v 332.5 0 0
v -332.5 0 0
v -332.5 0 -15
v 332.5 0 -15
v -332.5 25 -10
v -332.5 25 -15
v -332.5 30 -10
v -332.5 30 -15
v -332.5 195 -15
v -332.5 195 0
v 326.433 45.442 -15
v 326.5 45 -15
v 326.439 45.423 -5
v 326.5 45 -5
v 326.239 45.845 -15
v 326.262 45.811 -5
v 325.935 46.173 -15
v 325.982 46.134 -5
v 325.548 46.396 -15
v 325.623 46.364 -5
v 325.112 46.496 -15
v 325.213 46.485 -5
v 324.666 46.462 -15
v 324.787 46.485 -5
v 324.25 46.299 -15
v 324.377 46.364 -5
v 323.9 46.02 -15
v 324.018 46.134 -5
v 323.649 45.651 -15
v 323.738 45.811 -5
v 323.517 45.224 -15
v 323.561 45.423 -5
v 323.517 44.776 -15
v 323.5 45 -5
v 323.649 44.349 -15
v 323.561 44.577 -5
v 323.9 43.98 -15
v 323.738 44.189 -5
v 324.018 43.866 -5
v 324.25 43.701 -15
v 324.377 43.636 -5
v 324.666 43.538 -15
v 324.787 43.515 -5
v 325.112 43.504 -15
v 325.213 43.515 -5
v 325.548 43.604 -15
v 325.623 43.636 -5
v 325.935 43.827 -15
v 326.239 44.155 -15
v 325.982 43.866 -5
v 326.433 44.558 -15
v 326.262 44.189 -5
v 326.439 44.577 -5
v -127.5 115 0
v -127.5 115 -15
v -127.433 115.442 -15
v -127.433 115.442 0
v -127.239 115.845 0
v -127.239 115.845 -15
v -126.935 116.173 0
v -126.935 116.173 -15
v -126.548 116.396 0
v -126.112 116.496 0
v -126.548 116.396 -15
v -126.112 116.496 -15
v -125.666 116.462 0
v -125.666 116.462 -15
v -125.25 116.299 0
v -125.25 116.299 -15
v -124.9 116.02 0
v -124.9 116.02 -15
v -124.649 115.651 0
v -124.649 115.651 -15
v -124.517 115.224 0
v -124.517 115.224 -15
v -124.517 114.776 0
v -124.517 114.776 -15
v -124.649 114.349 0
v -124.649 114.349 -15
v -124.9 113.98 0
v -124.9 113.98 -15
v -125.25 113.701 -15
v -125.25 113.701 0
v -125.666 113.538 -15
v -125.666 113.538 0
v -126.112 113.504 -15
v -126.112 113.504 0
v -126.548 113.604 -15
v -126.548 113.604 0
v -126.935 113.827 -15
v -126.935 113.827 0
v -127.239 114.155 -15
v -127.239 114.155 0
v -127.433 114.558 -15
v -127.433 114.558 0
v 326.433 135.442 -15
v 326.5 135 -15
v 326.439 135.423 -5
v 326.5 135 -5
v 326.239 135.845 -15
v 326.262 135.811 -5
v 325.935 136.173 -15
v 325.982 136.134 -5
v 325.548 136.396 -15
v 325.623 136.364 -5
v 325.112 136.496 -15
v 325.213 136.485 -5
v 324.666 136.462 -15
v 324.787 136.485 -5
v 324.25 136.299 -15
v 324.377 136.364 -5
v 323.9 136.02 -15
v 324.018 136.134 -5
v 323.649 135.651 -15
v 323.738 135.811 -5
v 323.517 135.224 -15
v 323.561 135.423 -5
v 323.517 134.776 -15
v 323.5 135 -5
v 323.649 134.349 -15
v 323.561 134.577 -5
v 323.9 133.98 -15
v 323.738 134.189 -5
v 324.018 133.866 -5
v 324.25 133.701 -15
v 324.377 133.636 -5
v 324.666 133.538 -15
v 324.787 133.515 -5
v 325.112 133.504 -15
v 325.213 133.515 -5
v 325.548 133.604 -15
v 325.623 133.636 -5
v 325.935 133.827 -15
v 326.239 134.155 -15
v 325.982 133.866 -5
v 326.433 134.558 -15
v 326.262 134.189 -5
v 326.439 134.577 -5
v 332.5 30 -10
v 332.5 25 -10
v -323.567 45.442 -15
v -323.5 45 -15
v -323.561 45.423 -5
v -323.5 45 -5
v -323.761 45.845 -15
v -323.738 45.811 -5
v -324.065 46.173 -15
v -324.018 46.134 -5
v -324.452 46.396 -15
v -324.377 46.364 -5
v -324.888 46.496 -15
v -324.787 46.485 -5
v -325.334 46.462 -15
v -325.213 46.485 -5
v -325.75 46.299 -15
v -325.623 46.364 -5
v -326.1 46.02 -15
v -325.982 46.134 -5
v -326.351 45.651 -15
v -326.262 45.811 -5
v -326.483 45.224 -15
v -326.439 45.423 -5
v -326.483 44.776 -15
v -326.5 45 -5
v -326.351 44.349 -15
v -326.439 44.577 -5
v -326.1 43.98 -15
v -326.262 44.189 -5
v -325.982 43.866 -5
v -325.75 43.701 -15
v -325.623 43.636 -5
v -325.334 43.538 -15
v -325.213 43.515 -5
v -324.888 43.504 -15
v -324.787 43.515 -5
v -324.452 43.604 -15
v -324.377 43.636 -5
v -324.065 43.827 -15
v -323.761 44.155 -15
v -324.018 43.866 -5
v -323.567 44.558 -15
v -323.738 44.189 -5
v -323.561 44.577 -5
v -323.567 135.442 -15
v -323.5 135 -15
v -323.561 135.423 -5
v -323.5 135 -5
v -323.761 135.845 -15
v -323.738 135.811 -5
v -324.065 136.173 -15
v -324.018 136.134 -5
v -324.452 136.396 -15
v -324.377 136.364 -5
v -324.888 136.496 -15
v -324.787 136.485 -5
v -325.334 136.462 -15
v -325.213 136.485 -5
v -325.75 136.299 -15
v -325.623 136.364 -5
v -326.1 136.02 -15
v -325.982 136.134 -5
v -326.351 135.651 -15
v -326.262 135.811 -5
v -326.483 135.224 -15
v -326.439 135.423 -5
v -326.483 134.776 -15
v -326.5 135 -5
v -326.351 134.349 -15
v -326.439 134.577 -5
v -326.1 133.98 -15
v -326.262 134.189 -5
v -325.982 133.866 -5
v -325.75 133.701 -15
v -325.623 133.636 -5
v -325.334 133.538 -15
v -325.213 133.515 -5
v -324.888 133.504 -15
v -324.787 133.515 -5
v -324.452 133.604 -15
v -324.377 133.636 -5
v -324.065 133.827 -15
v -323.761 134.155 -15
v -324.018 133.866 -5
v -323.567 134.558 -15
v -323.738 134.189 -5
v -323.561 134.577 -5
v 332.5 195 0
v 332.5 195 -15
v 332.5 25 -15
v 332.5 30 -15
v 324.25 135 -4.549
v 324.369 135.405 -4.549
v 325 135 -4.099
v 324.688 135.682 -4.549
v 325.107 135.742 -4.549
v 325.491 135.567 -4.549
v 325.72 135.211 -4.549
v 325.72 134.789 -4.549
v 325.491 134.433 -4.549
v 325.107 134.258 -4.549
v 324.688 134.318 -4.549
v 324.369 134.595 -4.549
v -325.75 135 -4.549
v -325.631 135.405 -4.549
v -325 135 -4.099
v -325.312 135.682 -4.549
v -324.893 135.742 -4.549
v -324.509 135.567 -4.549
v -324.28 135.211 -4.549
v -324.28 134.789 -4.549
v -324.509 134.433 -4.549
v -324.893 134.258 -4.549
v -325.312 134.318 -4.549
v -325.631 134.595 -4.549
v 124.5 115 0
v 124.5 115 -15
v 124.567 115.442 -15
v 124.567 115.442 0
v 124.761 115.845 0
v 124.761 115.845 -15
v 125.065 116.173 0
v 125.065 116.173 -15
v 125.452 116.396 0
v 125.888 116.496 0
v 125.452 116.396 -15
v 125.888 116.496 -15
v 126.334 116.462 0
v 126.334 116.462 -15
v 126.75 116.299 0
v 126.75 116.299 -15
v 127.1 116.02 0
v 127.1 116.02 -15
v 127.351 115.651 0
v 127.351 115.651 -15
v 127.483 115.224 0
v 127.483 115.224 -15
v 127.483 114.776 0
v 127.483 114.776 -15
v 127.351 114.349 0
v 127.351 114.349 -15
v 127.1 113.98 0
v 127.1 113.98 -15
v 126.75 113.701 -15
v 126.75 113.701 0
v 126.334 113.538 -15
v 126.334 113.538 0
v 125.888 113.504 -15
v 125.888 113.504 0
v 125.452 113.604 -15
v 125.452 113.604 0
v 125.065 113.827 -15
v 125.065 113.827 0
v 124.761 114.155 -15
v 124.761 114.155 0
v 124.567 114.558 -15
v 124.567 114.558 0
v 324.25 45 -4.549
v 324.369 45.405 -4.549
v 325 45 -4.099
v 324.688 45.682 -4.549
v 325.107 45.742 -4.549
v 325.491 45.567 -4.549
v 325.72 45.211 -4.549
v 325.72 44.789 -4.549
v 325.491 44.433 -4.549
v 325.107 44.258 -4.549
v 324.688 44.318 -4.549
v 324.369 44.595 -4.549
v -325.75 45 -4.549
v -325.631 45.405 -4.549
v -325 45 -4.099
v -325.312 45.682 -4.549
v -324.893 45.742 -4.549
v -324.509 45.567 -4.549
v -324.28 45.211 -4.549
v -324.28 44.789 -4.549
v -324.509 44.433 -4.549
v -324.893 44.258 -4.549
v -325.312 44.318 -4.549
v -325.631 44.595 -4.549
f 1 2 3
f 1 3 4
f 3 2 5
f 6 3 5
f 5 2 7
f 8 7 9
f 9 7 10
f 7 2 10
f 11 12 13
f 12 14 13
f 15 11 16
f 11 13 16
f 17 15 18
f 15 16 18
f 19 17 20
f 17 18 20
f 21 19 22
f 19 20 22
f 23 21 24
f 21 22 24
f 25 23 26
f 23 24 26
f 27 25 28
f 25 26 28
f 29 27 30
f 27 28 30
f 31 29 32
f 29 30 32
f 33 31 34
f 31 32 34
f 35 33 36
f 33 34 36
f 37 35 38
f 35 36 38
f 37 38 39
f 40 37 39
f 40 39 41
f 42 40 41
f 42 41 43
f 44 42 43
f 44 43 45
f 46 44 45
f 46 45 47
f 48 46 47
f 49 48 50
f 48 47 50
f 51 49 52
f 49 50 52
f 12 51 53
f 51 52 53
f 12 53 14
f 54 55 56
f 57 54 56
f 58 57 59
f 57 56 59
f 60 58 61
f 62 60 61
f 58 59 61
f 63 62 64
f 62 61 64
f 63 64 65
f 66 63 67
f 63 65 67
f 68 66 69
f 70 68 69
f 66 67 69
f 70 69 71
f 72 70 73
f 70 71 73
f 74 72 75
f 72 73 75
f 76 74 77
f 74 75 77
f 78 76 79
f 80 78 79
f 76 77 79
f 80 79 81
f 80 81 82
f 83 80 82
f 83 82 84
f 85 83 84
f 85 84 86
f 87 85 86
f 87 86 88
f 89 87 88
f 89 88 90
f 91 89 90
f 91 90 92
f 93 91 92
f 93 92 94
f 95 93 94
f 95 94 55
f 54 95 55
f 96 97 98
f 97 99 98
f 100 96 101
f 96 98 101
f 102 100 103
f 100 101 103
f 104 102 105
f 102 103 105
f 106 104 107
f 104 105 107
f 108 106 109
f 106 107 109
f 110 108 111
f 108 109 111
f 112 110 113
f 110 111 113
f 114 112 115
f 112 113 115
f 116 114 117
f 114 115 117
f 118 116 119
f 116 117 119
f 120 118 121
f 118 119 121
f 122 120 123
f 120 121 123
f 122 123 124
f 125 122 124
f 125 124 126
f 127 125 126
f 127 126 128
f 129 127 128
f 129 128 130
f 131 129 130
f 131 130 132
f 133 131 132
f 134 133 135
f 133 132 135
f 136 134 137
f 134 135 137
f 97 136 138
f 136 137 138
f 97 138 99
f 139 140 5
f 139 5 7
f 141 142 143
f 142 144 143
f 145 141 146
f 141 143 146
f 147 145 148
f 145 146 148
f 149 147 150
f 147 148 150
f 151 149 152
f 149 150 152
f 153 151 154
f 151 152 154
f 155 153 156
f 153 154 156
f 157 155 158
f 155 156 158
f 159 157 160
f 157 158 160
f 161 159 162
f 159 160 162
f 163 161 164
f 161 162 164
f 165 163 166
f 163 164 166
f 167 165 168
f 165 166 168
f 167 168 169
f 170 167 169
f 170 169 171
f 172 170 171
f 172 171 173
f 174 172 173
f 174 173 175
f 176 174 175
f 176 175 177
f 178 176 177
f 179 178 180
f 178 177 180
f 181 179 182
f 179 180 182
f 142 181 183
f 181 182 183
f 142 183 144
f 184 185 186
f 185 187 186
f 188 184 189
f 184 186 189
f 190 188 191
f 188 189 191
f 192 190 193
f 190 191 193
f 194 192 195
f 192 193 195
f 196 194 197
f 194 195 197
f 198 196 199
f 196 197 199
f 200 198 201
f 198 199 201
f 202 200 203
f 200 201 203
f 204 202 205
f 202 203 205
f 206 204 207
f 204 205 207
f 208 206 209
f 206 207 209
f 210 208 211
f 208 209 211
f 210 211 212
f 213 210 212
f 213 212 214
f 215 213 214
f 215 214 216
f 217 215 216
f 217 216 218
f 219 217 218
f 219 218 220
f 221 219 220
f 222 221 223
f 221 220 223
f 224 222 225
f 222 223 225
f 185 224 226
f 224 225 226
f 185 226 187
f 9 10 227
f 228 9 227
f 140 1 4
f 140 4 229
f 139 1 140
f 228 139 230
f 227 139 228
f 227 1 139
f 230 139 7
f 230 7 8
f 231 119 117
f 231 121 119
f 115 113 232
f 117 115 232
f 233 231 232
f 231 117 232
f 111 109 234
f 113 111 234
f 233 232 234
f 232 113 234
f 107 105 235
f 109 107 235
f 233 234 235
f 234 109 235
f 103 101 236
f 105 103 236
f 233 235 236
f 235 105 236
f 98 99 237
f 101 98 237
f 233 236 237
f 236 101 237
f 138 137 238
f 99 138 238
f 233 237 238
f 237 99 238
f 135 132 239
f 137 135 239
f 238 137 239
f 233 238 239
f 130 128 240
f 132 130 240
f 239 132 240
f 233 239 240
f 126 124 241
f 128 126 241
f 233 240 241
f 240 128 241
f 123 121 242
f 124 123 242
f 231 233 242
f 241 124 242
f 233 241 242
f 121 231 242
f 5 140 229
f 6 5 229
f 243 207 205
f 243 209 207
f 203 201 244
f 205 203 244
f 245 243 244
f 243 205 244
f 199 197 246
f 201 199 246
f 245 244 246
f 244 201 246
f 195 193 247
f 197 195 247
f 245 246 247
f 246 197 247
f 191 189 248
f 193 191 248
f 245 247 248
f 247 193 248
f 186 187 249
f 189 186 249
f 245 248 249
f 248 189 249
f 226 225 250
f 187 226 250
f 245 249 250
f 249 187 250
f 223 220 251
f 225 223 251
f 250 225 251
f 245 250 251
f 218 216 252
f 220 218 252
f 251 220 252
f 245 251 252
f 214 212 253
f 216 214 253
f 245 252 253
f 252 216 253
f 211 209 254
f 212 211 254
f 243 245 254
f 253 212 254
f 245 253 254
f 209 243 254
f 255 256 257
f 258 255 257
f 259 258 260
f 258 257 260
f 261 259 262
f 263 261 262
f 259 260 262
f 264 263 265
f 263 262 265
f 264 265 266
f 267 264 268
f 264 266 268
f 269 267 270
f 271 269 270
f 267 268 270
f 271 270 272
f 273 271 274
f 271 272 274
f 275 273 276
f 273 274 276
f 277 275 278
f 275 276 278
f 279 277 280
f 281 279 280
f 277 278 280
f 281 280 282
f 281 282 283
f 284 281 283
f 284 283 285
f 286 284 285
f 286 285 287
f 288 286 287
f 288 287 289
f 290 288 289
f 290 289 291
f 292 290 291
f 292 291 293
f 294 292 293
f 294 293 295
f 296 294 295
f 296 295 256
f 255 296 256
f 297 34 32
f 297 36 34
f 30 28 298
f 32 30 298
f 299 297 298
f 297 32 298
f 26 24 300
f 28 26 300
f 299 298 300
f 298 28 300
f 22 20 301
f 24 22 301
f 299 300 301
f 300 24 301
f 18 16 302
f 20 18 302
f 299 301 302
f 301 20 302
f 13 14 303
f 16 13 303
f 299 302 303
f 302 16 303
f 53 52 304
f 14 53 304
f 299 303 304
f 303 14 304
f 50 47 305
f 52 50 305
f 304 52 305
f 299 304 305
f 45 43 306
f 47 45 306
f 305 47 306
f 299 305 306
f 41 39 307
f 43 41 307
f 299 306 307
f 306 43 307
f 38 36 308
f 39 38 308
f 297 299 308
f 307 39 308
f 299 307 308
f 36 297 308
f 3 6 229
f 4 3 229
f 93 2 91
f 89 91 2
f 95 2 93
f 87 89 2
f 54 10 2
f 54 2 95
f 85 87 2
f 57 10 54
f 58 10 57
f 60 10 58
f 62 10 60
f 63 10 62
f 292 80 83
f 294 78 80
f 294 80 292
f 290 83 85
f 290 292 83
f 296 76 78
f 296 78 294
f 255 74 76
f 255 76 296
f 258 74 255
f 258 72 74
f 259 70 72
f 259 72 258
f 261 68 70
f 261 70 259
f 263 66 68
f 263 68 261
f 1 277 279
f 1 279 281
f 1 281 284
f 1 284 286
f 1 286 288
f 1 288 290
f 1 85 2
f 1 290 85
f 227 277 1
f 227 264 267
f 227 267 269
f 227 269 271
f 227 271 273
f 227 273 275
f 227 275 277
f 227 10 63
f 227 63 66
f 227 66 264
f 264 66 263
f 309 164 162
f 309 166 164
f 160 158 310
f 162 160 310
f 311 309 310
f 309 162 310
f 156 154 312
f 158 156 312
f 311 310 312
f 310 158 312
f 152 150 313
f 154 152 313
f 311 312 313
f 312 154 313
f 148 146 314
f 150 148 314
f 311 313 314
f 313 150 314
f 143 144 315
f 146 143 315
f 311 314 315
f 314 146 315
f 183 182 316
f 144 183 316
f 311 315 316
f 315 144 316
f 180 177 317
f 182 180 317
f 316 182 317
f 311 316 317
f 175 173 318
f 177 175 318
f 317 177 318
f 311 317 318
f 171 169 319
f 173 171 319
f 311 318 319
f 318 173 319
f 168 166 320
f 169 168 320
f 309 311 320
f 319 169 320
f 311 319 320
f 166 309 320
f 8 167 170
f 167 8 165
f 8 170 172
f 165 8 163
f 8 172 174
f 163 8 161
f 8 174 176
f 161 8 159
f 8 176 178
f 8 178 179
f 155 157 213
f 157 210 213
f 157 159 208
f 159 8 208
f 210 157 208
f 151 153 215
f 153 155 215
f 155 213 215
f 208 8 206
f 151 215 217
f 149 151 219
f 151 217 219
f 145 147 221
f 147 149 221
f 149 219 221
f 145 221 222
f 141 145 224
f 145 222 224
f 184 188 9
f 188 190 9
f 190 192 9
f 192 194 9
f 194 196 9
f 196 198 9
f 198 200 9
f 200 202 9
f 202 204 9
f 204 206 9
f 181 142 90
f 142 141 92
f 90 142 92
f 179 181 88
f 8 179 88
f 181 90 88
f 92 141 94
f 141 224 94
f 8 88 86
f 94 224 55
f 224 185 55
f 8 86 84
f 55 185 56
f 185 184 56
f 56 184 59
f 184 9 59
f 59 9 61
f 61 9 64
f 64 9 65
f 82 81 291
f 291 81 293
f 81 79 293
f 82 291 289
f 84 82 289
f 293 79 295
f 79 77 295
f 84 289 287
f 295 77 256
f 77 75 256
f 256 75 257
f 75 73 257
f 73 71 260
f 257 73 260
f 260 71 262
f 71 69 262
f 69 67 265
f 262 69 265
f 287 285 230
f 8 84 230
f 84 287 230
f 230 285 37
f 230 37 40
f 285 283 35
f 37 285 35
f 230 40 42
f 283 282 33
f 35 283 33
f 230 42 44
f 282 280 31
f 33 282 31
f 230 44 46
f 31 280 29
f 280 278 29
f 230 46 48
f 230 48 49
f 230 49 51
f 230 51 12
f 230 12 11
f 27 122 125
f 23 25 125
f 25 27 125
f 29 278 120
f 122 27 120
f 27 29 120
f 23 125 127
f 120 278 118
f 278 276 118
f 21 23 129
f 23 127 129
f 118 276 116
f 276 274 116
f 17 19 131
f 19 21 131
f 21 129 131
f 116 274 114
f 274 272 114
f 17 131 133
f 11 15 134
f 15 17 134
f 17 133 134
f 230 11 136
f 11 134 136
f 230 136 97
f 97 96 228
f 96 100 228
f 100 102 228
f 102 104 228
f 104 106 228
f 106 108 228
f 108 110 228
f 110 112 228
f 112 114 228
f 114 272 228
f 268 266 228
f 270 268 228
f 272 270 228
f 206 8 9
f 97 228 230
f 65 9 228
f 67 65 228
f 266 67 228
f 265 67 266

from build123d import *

# Parameters (mm, degrees)
SKETCH1_W                          = 665
SKETCH1_H                          = 195
BASE_EXTRUDE_DEPTH                 = 15
SKETCH2_W                          = 5
SKETCH2_H                          = 5
CUT_EXTRUDE1_DEPTH                 = 694.163039984
M3_0_3_000000_DIAMETER_HOLE1_D     = 3
M3_0_3_000000_DIAMETER_HOLE2_D     = 3
M3_0_3_000000_DIAMETER_HOLE2_DEPTH = 10
M3_0_3_000000_DIAMETER_HOLE2_TIP   = 0.901290929


with BuildPart() as part:
    # Sketch1 → Base-Extrude (new body)
    with BuildSketch(Plane.XY):
        with Locations((0, 97.5)):
            Rectangle(SKETCH1_W, SKETCH1_H)
    extrude(amount=-BASE_EXTRUDE_DEPTH)

    # Sketch2 → Cut-Extrude1 (cut, through all)
    with BuildSketch(Plane(origin=(332.5, 0, 0), x_dir=(0, 0, -1), z_dir=(1, 0, 0))):
        with Locations((12.5, 27.5)):
            Rectangle(SKETCH2_W, SKETCH2_H)
    extrude(amount=-CUT_EXTRUDE1_DEPTH, mode=Mode.SUBTRACT)

    # M3.0 (3.000000) Diameter Hole1 (through all)
    with Locations(Plane.XY):
        with Locations((-126, 115), (126, 115)):
            Hole(M3_0_3_000000_DIAMETER_HOLE1_D / 2)

    # M3.0 (3.000000) Diameter Hole2
    with Locations(Plane(origin=(0, 0, -15), x_dir=(-1, 0, 0), z_dir=(0, 0, -1))):
        with Locations((-325, 135), (-325, 45), (325, 135), (325, 45)):
            Hole(M3_0_3_000000_DIAMETER_HOLE2_D / 2, depth=M3_0_3_000000_DIAMETER_HOLE2_DEPTH)
            with Locations((0, 0, -(M3_0_3_000000_DIAMETER_HOLE2_DEPTH + M3_0_3_000000_DIAMETER_HOLE2_TIP / 2))):  # 118° drill point
                Cone(0, M3_0_3_000000_DIAMETER_HOLE2_D / 2, M3_0_3_000000_DIAMETER_HOLE2_TIP, mode=Mode.SUBTRACT)


solid = part.part
